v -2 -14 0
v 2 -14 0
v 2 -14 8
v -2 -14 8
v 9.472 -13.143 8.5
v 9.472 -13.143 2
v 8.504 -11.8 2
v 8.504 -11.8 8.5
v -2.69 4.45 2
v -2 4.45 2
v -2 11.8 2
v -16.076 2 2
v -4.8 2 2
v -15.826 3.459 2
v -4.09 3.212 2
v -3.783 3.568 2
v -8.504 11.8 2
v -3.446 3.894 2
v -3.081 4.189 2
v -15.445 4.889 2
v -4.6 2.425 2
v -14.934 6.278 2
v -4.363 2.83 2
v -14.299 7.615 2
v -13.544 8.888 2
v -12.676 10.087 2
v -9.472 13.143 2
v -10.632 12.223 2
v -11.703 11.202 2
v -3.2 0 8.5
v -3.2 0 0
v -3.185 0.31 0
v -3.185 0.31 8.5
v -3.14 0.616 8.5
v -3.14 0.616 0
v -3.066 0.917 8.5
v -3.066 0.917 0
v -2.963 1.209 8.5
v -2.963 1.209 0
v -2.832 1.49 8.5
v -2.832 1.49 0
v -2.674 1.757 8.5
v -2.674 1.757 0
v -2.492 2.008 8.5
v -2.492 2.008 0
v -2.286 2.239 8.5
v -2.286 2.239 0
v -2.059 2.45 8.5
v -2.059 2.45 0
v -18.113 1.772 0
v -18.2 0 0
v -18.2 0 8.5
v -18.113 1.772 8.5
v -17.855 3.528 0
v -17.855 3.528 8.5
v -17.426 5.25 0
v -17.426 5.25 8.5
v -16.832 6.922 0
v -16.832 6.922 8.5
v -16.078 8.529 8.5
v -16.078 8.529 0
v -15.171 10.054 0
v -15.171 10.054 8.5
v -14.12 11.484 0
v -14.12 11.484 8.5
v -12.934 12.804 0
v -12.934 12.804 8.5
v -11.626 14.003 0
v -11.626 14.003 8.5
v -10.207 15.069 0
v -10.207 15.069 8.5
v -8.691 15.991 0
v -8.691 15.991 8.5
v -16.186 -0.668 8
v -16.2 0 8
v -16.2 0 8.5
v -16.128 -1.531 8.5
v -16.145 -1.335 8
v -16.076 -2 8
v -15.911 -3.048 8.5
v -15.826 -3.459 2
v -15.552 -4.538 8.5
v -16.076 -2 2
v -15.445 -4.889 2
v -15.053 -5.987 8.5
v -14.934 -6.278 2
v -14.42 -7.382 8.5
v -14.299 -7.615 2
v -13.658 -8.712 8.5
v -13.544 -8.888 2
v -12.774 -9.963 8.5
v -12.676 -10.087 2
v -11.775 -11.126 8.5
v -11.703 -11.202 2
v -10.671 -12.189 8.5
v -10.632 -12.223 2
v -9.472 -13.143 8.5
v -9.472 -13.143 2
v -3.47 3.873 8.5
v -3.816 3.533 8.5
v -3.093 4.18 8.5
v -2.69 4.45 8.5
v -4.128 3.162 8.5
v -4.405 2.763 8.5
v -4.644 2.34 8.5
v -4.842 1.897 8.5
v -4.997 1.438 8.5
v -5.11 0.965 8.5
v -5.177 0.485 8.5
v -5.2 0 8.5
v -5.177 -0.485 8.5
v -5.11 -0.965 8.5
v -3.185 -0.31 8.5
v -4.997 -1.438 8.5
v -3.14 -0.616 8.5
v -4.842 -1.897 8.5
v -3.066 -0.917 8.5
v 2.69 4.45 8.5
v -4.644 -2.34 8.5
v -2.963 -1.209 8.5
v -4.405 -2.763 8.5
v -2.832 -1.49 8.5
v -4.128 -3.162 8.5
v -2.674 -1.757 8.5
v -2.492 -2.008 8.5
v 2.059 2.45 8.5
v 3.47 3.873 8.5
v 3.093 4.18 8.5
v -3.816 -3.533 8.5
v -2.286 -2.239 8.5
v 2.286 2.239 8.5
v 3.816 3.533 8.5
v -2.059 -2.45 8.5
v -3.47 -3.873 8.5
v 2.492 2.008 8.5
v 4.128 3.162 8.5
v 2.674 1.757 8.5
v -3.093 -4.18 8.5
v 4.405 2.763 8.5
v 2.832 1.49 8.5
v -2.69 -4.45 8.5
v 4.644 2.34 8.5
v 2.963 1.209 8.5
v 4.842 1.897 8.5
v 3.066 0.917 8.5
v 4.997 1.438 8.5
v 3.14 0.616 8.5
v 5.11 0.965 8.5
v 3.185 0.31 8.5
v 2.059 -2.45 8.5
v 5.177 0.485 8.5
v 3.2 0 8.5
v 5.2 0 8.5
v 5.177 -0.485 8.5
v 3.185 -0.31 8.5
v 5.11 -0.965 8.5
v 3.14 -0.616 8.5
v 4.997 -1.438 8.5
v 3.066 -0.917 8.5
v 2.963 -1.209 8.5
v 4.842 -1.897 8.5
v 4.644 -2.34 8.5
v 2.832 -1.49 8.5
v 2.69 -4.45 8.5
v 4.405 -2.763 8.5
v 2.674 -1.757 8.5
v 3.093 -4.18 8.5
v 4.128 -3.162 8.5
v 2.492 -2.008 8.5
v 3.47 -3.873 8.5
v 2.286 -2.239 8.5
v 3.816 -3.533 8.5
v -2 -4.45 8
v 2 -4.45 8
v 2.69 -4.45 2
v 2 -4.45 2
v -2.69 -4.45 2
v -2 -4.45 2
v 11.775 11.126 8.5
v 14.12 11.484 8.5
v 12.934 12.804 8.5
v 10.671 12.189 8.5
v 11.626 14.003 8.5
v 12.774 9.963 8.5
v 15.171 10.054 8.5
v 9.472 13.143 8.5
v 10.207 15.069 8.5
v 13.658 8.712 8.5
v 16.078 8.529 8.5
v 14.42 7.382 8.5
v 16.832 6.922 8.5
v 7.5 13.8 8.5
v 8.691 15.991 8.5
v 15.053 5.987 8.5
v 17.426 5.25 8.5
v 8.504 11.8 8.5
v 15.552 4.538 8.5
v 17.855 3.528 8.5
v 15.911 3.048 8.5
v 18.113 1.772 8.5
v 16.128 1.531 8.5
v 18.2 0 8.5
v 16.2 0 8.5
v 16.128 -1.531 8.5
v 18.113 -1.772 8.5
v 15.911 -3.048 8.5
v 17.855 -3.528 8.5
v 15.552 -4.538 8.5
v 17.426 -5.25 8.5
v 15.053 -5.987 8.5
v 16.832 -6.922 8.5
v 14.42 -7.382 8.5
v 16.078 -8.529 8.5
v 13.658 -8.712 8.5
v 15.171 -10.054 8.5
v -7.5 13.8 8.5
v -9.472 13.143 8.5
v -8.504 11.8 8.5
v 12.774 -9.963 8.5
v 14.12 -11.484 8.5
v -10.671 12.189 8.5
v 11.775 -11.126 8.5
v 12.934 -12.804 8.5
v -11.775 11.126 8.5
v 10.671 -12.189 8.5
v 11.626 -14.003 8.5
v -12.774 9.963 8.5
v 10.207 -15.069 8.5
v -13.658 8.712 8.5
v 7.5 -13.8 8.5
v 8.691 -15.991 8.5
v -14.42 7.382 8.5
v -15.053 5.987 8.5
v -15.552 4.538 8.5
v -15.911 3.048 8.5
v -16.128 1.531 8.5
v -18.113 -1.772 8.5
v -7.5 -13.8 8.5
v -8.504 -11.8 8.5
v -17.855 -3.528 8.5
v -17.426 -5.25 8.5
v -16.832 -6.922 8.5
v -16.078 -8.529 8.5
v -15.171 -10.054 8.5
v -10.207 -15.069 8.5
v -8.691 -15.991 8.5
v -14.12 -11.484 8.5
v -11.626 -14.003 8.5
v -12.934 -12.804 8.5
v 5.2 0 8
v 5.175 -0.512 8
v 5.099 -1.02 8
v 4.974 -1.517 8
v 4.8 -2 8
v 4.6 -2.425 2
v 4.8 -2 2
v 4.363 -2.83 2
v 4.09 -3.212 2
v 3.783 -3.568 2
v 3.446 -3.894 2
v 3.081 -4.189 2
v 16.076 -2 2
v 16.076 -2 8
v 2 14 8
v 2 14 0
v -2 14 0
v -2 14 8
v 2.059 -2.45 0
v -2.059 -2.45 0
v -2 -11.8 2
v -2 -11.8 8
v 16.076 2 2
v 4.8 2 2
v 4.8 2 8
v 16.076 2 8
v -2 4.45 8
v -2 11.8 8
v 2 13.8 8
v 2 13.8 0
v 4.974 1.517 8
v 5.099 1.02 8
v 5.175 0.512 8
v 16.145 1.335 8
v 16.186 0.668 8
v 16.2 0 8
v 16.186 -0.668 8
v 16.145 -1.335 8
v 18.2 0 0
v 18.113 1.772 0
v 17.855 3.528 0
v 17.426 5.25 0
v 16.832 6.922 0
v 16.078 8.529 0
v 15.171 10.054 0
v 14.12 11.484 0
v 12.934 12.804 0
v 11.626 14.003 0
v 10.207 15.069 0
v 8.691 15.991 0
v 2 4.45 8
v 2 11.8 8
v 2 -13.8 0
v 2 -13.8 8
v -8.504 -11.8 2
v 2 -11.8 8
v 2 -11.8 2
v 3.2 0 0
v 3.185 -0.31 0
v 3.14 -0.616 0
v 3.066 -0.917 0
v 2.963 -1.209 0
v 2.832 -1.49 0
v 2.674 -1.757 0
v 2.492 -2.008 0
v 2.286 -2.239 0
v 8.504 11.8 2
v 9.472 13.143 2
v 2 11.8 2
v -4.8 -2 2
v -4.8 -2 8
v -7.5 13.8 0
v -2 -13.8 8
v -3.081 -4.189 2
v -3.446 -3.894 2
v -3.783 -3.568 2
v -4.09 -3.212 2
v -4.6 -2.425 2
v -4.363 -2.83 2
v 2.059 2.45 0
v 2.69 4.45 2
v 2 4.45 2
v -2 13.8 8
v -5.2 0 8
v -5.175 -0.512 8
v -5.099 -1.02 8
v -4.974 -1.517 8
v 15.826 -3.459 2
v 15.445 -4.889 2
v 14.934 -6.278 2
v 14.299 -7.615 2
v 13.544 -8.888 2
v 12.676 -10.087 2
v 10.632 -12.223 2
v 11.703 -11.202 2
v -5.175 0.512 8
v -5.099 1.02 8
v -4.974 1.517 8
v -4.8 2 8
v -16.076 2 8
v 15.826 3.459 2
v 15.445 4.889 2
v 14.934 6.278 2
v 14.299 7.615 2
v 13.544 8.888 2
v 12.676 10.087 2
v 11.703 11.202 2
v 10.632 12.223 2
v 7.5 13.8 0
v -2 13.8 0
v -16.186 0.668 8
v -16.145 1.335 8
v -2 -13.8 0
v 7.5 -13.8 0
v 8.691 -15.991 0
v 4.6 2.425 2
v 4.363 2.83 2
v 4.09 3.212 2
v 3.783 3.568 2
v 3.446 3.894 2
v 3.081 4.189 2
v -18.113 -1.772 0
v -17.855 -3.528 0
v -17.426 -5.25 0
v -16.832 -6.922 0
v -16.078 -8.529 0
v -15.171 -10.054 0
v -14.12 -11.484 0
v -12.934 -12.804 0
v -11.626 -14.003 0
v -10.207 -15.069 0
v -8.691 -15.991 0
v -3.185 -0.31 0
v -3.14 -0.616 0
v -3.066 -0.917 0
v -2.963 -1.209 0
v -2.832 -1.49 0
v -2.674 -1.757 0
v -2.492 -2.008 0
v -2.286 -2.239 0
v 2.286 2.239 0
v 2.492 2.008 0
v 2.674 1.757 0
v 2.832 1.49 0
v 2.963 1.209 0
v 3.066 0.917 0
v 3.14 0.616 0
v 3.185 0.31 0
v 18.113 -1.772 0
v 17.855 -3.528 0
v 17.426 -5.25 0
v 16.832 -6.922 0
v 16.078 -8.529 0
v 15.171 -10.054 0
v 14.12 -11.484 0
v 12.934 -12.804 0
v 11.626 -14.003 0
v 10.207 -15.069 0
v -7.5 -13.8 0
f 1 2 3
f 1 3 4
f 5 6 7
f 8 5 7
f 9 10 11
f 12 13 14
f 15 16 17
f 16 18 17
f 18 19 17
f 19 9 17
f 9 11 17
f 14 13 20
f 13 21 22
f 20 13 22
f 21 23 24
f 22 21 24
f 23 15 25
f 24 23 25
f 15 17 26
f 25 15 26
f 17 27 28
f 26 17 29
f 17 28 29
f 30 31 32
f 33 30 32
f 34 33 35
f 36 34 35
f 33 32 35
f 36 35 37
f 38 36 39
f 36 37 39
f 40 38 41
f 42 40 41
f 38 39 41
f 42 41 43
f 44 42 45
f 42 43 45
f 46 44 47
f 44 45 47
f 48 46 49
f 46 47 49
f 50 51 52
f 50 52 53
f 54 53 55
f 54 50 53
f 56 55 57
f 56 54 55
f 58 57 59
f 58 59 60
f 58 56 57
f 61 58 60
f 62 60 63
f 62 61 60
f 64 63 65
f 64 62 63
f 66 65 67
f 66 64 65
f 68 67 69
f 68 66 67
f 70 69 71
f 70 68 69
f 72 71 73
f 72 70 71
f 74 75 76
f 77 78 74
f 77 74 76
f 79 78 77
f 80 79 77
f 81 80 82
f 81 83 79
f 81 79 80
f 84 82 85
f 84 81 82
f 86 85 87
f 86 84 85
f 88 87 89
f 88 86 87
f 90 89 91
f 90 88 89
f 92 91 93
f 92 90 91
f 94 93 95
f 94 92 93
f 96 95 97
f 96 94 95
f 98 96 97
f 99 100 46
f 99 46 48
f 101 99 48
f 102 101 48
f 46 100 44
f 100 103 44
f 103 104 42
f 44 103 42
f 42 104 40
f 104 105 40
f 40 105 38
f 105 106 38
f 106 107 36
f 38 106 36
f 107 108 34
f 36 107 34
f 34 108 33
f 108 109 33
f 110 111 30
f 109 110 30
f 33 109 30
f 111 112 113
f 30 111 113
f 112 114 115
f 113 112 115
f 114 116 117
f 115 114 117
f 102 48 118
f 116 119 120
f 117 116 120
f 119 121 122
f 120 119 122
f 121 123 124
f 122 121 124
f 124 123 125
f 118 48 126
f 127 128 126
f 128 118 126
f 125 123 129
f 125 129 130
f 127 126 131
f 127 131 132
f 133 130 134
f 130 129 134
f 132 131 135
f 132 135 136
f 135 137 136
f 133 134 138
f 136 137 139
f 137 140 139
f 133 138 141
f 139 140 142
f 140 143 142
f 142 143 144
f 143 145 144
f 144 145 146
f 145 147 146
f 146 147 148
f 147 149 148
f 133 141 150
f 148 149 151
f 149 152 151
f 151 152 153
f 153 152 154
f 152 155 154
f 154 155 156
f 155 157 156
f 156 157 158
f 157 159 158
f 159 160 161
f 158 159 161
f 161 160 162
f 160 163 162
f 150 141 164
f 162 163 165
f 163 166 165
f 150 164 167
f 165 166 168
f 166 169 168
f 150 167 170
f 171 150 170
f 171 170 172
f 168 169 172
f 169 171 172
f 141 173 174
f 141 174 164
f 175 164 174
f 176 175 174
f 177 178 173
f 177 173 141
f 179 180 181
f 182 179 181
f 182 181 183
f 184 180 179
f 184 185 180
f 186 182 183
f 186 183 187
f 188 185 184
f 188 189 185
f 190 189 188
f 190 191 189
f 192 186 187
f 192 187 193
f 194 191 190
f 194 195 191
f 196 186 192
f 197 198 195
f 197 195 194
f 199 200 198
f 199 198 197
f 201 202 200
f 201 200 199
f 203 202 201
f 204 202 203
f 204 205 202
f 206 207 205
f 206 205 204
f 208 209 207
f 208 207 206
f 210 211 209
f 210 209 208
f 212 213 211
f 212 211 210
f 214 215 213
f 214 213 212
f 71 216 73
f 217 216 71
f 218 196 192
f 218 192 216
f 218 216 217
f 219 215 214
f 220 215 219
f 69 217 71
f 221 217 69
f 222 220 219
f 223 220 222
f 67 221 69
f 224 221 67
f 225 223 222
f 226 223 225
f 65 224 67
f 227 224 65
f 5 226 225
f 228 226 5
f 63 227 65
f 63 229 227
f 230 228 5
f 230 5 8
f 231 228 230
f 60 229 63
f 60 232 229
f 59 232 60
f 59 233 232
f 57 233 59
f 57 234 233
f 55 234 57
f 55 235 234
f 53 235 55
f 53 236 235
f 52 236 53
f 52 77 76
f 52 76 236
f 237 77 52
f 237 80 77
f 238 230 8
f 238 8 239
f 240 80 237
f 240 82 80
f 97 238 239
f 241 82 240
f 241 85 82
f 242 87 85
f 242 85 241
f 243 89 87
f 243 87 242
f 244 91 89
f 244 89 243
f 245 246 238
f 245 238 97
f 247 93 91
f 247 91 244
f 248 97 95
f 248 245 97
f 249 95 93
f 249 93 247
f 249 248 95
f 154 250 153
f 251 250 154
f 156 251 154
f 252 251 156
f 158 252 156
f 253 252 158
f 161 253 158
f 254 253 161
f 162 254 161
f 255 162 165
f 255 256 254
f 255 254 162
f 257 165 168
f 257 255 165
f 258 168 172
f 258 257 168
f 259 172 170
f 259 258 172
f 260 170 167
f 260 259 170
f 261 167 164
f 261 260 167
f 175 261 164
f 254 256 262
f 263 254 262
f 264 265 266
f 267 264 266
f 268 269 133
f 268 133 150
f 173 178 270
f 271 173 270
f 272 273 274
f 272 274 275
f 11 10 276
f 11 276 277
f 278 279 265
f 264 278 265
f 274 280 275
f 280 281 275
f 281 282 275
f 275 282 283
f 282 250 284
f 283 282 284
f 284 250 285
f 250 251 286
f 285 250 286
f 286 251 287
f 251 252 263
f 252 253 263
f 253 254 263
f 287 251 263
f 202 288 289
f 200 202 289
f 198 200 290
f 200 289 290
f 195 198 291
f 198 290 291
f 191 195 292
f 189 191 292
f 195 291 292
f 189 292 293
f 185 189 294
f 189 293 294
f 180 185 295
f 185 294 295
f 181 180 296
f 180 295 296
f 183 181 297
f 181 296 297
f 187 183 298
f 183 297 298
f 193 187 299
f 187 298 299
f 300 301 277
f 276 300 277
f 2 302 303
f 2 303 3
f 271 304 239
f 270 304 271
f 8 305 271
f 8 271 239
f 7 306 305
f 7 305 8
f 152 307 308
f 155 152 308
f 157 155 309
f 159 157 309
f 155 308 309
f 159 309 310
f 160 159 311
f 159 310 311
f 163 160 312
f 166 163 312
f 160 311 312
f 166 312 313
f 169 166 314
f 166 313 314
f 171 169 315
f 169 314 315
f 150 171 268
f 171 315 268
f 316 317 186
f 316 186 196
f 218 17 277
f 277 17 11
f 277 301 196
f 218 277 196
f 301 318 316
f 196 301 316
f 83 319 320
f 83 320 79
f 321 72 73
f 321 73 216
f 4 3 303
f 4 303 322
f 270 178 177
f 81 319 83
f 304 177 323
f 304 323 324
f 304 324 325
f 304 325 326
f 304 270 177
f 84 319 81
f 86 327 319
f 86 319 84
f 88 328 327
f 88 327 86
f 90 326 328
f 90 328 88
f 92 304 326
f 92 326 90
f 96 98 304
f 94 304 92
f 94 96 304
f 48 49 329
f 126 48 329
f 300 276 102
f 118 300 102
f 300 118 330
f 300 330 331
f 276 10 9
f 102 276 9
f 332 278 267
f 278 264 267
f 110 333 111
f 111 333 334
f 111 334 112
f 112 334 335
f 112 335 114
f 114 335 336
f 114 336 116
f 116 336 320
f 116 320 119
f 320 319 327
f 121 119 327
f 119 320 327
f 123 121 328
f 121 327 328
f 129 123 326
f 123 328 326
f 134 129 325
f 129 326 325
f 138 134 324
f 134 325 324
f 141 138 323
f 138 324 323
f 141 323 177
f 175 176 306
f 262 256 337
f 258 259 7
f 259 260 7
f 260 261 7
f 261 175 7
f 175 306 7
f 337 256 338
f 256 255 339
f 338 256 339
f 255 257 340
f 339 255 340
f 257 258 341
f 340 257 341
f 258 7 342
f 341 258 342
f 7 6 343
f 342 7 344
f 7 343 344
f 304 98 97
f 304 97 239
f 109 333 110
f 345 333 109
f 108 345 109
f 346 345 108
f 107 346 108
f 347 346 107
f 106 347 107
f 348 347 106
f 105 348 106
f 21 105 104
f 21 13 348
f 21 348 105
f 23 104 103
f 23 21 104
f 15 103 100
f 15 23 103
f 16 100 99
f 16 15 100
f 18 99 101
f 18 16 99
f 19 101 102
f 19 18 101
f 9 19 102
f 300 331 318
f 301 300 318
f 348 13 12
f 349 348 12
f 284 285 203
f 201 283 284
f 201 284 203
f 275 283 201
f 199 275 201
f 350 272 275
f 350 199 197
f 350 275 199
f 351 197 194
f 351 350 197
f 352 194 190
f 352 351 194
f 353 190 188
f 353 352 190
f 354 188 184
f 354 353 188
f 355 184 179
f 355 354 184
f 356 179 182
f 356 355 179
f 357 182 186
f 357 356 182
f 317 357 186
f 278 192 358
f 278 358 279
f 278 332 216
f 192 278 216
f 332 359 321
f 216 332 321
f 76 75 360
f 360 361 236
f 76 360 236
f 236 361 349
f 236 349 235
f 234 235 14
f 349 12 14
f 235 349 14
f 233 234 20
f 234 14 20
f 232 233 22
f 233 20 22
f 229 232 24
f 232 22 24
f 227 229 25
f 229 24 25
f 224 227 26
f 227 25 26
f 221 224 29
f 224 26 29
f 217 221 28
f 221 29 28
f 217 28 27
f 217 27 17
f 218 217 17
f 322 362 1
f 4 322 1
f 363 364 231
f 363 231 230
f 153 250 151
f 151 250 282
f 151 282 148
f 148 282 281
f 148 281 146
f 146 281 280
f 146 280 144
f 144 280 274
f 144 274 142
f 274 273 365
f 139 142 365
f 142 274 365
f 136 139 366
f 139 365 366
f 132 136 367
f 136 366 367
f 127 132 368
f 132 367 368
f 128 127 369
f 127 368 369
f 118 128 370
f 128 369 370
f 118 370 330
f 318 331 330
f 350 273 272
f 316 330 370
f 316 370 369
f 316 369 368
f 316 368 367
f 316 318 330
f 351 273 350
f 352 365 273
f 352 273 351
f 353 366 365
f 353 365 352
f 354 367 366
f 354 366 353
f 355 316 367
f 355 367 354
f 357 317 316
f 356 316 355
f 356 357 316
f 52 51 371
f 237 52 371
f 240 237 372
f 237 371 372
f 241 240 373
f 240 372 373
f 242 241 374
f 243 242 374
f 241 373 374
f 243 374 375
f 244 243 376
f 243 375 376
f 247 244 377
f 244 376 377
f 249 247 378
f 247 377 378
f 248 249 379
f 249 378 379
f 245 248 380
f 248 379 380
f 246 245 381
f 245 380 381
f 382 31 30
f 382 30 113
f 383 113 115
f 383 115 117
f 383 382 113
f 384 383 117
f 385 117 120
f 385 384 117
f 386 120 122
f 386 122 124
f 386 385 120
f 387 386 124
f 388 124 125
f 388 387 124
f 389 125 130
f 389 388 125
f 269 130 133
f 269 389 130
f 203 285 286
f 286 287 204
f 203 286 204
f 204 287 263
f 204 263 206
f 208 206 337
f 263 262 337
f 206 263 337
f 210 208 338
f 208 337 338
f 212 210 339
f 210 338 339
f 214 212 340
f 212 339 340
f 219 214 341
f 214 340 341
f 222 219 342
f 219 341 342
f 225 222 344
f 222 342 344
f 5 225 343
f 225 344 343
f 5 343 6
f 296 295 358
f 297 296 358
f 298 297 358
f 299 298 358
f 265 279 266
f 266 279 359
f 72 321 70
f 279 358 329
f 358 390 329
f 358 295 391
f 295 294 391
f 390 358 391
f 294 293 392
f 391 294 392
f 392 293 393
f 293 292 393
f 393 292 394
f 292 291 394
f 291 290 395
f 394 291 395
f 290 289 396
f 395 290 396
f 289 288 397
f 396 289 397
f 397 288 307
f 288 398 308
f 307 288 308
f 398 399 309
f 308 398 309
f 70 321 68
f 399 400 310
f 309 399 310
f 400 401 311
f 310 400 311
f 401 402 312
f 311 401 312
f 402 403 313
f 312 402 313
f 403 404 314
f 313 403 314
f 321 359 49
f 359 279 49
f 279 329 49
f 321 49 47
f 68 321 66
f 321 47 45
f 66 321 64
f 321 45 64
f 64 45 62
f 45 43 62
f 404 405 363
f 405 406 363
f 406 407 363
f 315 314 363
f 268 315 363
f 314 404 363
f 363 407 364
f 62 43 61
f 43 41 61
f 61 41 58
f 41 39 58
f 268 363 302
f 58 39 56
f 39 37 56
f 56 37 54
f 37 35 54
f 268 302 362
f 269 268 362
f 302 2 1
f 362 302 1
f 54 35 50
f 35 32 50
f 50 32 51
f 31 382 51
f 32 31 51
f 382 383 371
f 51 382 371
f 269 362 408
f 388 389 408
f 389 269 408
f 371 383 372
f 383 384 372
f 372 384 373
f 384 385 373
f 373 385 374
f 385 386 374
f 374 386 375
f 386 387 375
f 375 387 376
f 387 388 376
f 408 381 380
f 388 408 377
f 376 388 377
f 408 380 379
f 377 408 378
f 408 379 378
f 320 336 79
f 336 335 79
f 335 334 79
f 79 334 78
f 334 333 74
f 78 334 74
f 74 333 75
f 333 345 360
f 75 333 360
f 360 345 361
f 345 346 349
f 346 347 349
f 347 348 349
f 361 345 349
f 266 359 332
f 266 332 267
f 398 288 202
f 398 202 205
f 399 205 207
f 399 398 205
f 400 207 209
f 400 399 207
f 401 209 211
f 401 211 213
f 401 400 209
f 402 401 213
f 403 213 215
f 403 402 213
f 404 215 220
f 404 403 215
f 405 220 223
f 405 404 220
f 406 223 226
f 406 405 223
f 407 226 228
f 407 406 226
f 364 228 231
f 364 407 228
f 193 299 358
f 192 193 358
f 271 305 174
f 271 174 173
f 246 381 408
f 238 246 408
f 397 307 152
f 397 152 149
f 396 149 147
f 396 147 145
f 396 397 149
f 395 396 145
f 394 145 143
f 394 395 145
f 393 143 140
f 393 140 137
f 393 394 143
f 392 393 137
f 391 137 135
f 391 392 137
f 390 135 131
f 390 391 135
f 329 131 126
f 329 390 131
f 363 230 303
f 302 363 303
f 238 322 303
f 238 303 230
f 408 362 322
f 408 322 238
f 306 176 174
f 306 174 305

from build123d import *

# Parameters (mm, degrees)
PAD_DEPTH                = 8.5
PAD001_DEPTH             = 2
PAD002_DEPTH             = 8.5
SKETCH003_W              = 2
SKETCH003_H              = 10
SKETCH003_W_2            = 14
SKETCH003_H_2            = 2
PAD003_DEPTH             = 8
SKETCH003_MIRRORED_2_W   = 2
SKETCH003_MIRRORED_2_H   = 10
SKETCH003_MIRRORED_2_W_2 = 14
SKETCH003_MIRRORED_2_H_2 = 2
PAD003_MIRRORED_2_DEPTH  = 8
PAD002_MIRRORED_2_DEPTH  = 8.5
PAD001_MIRRORED_2_DEPTH  = 2
PAD_MIRRORED_2_DEPTH     = 8.5


with BuildPart() as part:
    # Sketch → Pad (new body)
    with BuildSketch(Plane.XY):
        with BuildLine():
            ThreePointArc((18.2, 0), (15.643074, 9.302378), (8.690742, 15.990966))
            Line((8.690742, 15.990966), (7.5, 13.8))
            Line((0, 13.8), (7.5, 13.8))
            Line((0, 11.8), (0, 13.8))
            Line((8.504147, 11.8), (0, 11.8))
            Line((9.471711, 13.142552), (8.504147, 11.8))
            ThreePointArc((16.2, 0), (14.420155, 7.382353), (9.471711, 13.142552))
            Line((16.2, 0), (18.2, 0))
        make_face()
    pad = extrude(amount=PAD_DEPTH)

    # Sketch001 → Pad001 (join)
    with BuildSketch(Plane.XY):
        with BuildLine():
            ThreePointArc((18, 0), (15.499386, 9.152543), (8.692328, 15.762088))
            Line((8.692328, 15.762088), (7.5, 13.6))
            Line((0, 13.6), (7.5, 13.6))
            Line((0, 4), (0, 13.6))
            ThreePointArc((4, 0), (2.828427, 2.828427), (0, 4))
            Line((4, 0), (18, 0))
        make_face()
    pad001 = extrude(amount=PAD001_DEPTH)

    # Sketch002 → Pad002 (join)
    with BuildSketch(Plane.XY):
        with BuildLine():
            ThreePointArc((3.2, 0), (2.900626, 1.351432), (2.058519, 2.45))
            Line((2.058519, 2.45), (0, 2.45))
            Line((0, 2.45), (0, 4.45))
            Line((0, 4.45), (2.69026, 4.45))
            ThreePointArc((5.2, 0), (4.529313, 2.554471), (2.69026, 4.45))
            Line((3.2, 0), (5.2, 0))
        make_face()
    pad002 = extrude(amount=PAD002_DEPTH)

    # Sketch003 → Pad003 (join)
    with BuildSketch(Plane.XY):
        with Locations((1, 9)):
            Rectangle(SKETCH003_W, SKETCH003_H)
        with Locations((11, 1)):
            Rectangle(SKETCH003_W_2, SKETCH003_H_2)
    pad003 = extrude(amount=PAD003_DEPTH)

    # Sketch003 Mirrored 2 → Pad003 Mirrored 2 (add)
    with BuildSketch(Plane(origin=(0, 0, 0), x_dir=(-1, 0, 0), z_dir=(0, 0, -1))):
        with Locations((1, 9)):
            Rectangle(SKETCH003_MIRRORED_2_W, SKETCH003_MIRRORED_2_H)
        with Locations((11, 1)):
            Rectangle(SKETCH003_MIRRORED_2_W_2, SKETCH003_MIRRORED_2_H_2)
    pad003_mirrored_2 = extrude(amount=-PAD003_MIRRORED_2_DEPTH)

    # Sketch002 Mirrored 2 → Pad002 Mirrored 2 (add)
    with BuildSketch(Plane(origin=(0, 0, 0), x_dir=(-1, 0, 0), z_dir=(0, 0, -1))):
        with BuildLine():
            ThreePointArc((3.2, 0), (2.900626, 1.351432), (2.058519, 2.45))
            Line((2.058519, 2.45), (0, 2.45))
            Line((0, 2.45), (0, 4.45))
            Line((0, 4.45), (2.69026, 4.45))
            ThreePointArc((5.2, 0), (4.529313, 2.554471), (2.69026, 4.45))
            Line((3.2, 0), (5.2, 0))
        make_face()
    pad002_mirrored_2 = extrude(amount=-PAD002_MIRRORED_2_DEPTH)

    # Sketch001 Mirrored 2 → Pad001 Mirrored 2 (add)
    with BuildSketch(Plane(origin=(0, 0, 0), x_dir=(-1, 0, 0), z_dir=(0, 0, -1))):
        with BuildLine():
            ThreePointArc((18, 0), (15.499386, 9.152543), (8.692328, 15.762088))
            Line((8.692328, 15.762088), (7.5, 13.6))
            Line((0, 13.6), (7.5, 13.6))
            Line((0, 4), (0, 13.6))
            ThreePointArc((4, 0), (2.828427, 2.828427), (0, 4))
            Line((4, 0), (18, 0))
        make_face()
    pad001_mirrored_2 = extrude(amount=-PAD001_MIRRORED_2_DEPTH)

    # Sketch Mirrored 2 → Pad Mirrored 2 (add)
    with BuildSketch(Plane(origin=(0, 0, 0), x_dir=(-1, 0, 0), z_dir=(0, 0, -1))):
        with BuildLine():
            ThreePointArc((18.2, 0), (15.643074, 9.302378), (8.690742, 15.990966))
            Line((8.690742, 15.990966), (7.5, 13.8))
            Line((0, 13.8), (7.5, 13.8))
            Line((0, 11.8), (0, 13.8))
            Line((8.504147, 11.8), (0, 11.8))
            Line((9.471711, 13.142552), (8.504147, 11.8))
            ThreePointArc((16.2, 0), (14.420155, 7.382353), (9.471711, 13.142552))
            Line((16.2, 0), (18.2, 0))
        make_face()
    pad_mirrored_2 = extrude(amount=-PAD_MIRRORED_2_DEPTH)

    # Mirrored001: Pad003, Pad002, Pad001, Pad, Pad003 Mirrored 2, Pad002 Mirrored 2, Pad001 Mirrored 2, Pad Mirrored 2 across Sketch003 H_Axis
    add(pad003.mirror(Plane.ZX))
    add(pad002.mirror(Plane.ZX))
    add(pad001.mirror(Plane.ZX))
    add(pad.mirror(Plane.ZX))
    add(pad003_mirrored_2.mirror(Plane.ZX))
    add(pad002_mirrored_2.mirror(Plane.ZX))
    add(pad001_mirrored_2.mirror(Plane.ZX))
    add(pad_mirrored_2.mirror(Plane.ZX))


solid = part.part
